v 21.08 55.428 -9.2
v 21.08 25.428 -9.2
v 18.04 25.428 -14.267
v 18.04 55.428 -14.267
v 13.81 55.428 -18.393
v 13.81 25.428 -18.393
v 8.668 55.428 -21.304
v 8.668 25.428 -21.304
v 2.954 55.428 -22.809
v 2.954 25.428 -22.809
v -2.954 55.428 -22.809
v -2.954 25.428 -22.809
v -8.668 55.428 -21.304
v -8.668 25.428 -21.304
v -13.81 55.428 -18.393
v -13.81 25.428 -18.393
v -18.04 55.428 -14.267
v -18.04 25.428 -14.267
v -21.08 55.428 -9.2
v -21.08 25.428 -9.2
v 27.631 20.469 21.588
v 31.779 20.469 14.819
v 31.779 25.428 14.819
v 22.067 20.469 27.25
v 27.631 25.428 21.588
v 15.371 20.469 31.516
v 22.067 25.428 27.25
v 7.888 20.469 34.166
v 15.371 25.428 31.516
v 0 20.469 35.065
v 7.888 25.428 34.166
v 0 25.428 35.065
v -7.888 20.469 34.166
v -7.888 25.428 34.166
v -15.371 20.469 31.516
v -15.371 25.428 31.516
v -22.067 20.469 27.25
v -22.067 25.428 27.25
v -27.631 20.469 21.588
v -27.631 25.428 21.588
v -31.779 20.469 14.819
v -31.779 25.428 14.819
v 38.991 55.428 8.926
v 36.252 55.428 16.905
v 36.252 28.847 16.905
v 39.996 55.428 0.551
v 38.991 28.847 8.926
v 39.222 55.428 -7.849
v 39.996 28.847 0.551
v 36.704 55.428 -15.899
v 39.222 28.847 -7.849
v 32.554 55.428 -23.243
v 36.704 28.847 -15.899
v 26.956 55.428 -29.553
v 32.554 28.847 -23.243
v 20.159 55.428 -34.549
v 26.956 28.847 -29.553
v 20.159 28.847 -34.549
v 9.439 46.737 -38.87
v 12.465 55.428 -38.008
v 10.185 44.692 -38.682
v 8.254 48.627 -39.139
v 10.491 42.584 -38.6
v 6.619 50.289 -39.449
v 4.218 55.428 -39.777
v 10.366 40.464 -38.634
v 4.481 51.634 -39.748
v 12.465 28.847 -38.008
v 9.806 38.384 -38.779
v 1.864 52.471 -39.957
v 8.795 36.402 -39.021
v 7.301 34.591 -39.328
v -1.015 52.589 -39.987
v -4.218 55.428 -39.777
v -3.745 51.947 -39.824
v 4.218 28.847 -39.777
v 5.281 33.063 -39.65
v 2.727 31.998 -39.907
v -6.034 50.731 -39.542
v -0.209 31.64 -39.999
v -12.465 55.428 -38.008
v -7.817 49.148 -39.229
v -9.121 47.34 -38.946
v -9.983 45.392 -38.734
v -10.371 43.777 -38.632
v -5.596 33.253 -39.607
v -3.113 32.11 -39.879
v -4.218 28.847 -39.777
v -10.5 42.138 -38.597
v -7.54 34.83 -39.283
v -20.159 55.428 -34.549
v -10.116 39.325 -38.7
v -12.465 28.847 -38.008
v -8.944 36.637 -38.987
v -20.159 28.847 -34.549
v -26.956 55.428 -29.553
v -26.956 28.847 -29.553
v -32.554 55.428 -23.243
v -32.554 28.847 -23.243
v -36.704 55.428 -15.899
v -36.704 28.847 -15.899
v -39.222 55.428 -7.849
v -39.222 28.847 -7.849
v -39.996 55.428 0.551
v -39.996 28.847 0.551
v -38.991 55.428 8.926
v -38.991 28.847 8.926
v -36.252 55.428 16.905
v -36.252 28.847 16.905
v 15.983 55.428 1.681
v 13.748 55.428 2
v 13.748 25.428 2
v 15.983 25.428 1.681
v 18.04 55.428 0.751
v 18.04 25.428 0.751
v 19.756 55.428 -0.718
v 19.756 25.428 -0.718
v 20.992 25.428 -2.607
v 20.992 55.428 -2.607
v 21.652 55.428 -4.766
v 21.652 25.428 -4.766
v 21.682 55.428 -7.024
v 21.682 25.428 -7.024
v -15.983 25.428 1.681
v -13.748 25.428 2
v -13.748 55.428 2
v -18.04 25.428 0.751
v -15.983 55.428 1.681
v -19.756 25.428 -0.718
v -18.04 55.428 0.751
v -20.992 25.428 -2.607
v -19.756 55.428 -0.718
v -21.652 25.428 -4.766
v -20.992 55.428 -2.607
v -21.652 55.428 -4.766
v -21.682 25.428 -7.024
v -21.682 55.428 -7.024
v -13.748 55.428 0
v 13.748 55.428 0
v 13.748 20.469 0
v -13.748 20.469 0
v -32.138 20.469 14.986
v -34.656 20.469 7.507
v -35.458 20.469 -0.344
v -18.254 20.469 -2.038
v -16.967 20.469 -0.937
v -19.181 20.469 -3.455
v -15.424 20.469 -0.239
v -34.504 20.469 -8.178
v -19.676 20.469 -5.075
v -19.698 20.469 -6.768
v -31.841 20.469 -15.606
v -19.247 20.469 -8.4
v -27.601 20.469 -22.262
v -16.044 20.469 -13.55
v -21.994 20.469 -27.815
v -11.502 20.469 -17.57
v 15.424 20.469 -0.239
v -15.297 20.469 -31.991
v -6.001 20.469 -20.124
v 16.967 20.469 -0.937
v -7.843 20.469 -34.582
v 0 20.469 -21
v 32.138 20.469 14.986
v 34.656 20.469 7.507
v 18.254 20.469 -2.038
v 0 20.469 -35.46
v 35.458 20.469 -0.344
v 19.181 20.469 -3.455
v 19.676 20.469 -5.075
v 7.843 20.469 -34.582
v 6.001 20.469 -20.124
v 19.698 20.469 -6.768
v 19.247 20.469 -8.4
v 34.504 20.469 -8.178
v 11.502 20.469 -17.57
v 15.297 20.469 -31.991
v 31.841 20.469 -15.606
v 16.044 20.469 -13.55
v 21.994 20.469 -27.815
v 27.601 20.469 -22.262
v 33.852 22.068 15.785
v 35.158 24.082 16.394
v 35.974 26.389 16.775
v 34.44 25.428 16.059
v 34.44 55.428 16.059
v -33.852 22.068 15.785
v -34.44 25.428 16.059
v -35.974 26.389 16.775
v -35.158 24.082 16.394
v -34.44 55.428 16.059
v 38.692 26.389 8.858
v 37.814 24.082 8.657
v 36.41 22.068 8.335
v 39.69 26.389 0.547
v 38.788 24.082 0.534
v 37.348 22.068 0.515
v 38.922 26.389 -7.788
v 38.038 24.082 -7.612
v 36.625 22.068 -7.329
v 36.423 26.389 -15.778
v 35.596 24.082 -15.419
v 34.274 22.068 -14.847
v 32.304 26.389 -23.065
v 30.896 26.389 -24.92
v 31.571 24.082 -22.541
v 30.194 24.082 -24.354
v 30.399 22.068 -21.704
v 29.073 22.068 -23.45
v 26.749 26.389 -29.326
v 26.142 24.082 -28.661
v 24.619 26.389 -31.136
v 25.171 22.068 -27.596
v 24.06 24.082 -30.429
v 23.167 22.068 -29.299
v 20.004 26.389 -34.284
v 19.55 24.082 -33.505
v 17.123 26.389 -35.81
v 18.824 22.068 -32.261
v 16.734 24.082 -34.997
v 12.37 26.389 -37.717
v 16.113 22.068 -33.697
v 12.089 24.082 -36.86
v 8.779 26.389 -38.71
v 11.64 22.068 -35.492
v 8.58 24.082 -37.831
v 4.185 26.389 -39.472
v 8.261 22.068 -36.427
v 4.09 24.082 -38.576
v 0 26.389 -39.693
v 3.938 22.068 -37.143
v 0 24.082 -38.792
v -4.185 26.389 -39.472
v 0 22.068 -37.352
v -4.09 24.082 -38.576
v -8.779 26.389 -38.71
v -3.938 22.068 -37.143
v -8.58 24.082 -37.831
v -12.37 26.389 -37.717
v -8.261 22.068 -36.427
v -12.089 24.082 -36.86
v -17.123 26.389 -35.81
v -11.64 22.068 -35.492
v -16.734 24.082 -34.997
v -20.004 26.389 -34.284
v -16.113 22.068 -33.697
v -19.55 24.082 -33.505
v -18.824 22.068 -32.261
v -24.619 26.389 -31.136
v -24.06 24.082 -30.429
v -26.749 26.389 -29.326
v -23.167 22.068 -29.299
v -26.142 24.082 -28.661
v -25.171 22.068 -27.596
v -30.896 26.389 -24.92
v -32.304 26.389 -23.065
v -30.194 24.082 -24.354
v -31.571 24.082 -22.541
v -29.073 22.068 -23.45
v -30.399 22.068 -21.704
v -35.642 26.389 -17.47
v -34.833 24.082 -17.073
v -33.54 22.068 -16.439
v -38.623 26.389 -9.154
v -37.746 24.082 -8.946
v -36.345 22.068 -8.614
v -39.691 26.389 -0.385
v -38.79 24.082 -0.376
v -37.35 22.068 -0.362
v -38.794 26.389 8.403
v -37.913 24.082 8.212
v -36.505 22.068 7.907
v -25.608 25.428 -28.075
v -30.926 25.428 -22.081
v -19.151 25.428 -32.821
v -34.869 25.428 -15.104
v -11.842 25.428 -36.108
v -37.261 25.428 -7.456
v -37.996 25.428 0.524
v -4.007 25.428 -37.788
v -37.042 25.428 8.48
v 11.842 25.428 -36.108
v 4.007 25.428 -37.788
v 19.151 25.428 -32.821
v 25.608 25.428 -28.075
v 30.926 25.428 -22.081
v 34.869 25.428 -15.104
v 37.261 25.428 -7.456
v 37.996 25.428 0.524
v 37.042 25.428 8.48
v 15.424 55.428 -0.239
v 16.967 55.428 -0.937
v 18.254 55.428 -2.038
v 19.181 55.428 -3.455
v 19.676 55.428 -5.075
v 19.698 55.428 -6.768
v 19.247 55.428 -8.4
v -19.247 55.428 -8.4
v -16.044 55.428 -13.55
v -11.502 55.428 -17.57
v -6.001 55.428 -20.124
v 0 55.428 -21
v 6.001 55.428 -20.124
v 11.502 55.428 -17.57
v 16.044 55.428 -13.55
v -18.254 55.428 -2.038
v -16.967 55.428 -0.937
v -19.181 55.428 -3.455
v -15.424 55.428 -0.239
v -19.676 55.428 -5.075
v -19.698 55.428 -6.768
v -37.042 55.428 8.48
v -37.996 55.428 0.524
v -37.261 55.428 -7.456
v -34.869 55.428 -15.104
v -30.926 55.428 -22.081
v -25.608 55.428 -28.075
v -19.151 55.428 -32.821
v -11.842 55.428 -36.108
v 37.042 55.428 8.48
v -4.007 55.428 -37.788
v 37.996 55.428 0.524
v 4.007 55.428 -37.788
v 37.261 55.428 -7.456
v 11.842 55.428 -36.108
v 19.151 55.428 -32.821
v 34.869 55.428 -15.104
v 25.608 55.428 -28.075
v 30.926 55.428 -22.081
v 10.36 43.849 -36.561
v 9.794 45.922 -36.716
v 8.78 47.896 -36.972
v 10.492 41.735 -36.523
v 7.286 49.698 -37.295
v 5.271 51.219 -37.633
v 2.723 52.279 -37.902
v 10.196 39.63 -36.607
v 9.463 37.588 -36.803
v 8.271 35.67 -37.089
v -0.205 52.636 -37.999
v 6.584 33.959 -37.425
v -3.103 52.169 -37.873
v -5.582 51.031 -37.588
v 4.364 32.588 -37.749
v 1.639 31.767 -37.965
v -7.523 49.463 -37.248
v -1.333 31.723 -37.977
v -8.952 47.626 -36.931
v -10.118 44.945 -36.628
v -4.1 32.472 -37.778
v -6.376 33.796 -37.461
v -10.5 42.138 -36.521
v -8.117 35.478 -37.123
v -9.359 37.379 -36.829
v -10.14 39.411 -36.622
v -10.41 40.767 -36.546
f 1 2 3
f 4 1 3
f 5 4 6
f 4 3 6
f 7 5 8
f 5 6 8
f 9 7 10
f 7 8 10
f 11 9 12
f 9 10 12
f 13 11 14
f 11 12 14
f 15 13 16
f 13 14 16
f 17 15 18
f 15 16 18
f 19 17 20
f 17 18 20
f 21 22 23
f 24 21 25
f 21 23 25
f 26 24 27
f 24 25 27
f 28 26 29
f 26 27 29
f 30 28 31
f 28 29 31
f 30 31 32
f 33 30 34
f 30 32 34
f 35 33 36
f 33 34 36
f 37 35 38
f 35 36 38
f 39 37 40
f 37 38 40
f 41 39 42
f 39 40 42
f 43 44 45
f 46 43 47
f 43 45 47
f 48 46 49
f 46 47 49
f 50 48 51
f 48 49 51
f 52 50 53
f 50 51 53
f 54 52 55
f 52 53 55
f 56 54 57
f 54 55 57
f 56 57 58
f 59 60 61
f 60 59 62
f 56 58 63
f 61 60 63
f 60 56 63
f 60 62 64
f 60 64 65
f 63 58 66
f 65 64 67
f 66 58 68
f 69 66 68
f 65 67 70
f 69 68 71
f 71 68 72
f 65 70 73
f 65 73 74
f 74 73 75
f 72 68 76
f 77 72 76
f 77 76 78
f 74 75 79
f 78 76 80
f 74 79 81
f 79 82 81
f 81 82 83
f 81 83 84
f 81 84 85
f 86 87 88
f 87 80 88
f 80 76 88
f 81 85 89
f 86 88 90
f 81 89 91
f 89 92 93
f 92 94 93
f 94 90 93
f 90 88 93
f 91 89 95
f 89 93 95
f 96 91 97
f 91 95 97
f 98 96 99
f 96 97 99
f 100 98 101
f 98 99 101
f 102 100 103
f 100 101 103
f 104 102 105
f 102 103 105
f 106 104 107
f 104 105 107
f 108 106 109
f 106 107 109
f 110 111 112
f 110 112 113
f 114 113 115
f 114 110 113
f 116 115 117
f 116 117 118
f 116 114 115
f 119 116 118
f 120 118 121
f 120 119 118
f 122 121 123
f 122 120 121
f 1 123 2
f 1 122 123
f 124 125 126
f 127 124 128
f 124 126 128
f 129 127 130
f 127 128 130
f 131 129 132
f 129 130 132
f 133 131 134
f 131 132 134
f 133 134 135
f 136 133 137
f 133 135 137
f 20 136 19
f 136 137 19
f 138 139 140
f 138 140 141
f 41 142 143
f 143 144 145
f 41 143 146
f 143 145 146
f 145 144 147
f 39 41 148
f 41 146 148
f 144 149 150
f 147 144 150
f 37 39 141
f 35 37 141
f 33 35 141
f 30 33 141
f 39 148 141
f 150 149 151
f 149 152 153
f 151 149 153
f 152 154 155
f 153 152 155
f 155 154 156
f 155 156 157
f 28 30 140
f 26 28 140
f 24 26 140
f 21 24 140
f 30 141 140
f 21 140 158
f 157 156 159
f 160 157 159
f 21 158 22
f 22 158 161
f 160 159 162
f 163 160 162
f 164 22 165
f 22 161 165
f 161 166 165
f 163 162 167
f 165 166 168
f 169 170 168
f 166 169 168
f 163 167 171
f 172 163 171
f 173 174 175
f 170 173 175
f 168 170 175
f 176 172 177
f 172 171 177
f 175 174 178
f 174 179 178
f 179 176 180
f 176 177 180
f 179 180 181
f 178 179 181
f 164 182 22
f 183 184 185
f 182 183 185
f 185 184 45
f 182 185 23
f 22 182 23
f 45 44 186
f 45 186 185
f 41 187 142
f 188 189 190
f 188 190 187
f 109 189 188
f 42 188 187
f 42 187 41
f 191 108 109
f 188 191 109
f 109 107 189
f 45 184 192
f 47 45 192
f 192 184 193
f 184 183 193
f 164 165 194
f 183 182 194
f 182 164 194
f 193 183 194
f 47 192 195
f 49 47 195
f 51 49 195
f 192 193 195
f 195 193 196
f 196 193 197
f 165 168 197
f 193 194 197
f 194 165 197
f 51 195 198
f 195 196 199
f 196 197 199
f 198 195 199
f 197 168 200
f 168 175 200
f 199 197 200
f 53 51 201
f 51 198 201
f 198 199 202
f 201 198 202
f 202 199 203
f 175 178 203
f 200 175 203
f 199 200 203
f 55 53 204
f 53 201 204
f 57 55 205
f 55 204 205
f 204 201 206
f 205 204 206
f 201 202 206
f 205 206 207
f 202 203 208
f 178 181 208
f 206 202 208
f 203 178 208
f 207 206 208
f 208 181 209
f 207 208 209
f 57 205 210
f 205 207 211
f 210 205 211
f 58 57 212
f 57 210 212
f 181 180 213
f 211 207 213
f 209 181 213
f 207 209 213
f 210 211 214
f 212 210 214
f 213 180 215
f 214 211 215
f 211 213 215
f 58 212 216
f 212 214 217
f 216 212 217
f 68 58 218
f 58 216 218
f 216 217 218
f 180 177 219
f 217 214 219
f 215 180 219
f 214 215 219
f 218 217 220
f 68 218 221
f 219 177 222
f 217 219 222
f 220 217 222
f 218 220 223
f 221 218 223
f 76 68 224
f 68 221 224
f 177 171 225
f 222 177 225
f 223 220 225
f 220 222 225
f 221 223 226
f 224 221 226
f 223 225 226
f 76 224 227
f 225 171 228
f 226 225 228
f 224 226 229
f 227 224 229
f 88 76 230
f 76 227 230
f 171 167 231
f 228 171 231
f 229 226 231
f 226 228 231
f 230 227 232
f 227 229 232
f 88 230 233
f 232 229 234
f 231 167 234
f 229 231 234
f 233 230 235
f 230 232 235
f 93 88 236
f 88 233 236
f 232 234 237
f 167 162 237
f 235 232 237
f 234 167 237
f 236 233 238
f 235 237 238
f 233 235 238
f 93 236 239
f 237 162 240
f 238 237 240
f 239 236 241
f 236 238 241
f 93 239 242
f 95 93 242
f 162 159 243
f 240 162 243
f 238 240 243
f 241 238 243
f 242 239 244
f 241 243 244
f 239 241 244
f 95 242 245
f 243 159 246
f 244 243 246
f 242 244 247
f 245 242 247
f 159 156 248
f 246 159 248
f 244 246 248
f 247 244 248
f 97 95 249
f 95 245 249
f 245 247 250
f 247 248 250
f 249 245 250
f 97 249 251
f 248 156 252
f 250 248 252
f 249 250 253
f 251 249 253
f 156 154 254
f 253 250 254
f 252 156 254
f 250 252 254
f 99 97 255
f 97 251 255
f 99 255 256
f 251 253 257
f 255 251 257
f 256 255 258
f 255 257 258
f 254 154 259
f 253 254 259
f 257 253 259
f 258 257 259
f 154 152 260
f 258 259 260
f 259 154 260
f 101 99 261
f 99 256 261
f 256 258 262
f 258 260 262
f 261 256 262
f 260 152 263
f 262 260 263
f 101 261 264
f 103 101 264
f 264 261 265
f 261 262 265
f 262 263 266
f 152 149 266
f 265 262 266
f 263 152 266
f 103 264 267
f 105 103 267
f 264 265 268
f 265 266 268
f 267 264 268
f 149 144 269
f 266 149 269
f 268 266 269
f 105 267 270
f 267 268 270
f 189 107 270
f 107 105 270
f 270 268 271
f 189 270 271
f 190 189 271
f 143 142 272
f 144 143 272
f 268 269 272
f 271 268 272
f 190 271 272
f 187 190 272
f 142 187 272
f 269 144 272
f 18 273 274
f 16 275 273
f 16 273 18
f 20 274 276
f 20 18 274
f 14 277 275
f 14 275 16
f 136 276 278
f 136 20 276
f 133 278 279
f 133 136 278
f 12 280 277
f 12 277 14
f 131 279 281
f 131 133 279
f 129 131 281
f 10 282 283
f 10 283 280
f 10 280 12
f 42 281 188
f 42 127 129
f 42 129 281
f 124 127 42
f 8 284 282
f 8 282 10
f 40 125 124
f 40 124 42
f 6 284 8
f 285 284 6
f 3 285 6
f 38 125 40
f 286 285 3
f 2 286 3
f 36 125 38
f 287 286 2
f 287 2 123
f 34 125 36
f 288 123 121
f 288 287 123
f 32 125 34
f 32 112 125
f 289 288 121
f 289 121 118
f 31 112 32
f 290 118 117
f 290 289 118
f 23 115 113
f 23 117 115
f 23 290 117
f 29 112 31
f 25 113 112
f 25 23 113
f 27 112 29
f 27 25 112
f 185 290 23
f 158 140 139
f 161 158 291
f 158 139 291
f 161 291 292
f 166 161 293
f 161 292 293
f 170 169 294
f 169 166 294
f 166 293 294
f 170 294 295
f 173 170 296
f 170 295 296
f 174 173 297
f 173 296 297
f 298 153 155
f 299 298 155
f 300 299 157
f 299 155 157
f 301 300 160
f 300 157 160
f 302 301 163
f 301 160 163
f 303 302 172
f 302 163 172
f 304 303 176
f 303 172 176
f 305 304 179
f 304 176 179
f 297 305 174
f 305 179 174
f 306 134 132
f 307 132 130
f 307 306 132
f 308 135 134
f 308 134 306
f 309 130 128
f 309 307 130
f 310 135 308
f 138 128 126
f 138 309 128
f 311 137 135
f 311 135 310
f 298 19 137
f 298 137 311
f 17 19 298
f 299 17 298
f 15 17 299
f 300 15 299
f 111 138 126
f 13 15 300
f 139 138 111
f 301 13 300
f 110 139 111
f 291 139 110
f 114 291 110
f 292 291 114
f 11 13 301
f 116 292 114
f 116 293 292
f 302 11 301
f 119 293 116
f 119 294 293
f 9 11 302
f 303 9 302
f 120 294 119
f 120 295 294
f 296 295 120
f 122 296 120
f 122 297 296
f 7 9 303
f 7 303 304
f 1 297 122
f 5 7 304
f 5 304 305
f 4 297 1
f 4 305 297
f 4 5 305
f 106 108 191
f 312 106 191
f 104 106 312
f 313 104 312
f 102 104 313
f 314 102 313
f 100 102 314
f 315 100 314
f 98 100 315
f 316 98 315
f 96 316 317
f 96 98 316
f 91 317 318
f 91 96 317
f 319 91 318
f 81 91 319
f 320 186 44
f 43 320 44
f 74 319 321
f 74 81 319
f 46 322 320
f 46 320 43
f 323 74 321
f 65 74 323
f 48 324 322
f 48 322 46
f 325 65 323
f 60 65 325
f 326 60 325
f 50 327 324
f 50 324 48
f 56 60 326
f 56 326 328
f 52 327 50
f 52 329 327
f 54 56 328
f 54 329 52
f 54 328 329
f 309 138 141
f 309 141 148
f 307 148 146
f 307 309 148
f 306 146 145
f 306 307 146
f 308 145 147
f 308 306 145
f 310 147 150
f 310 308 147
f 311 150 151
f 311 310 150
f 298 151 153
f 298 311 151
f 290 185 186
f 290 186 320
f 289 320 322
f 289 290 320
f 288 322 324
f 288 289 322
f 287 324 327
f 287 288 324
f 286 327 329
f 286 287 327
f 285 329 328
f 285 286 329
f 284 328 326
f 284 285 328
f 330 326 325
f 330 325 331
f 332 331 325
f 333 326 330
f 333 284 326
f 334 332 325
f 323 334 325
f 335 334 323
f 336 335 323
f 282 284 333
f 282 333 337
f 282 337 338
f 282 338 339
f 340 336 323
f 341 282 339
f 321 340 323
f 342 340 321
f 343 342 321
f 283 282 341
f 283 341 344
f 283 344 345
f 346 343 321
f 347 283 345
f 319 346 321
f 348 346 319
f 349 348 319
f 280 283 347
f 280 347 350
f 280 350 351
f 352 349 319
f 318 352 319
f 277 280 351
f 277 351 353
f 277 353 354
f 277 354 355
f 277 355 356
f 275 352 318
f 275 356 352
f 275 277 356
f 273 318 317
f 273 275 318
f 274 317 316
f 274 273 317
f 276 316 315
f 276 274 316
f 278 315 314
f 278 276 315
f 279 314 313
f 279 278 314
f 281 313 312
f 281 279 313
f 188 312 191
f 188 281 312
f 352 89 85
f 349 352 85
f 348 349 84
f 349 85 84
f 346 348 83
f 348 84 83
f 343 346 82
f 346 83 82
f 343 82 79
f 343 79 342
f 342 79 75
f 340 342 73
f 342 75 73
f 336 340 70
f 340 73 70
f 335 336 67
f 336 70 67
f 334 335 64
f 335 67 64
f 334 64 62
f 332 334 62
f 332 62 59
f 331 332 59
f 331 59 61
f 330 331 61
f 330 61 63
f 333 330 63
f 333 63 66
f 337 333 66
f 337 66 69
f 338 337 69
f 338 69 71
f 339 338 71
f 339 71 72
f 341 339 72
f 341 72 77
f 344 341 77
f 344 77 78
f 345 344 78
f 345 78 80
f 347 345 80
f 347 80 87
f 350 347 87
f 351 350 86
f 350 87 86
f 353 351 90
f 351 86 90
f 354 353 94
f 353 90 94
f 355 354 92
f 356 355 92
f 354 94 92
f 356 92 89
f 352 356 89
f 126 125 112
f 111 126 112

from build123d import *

# Parameters (mm, degrees)
CUT_EXTRUDE3_DEPTH           = 60
CUT_EXTRUDE5_DEPTH           = 2
CUT_EXTRUDE5_DEPTH_BACK      = 30
SKETCH9_R                    = 38
SKETCH9_R_2                  = 23
SKETCH19_W                   = 12
SKETCH19_H                   = 36.5
CUT_REVOLVE2_ANGLE           = 65
CUT_REVOLVE2_OTHER_WAY_ANGLE = 65
SKETCH21_W                   = 3.25
SKETCH21_H                   = 4
BOSS_EXTRUDE3_DEPTH          = 1.35
CIRPATTERN1_COUNT            = 5
CUT_EXTRUDE9_START           = -5
CUT_EXTRUDE9_DEPTH           = 5
SKETCH23_R                   = 10.5
CUT_EXTRUDE10_DEPTH          = 10
SKETCH24_W                   = 17
SKETCH24_H                   = 12
BOSS_EXTRUDE4_DEPTH          = 8
SKETCH26_W                   = 12
SKETCH26_H                   = 8
CUT_EXTRUDE11_DEPTH          = 10
SKETCH27_W                   = 4
SKETCH27_H                   = 5
CUT_EXTRUDE12_DEPTH          = 5
CUT_EXTRUDE14_DEPTH          = 2
CUT_EXTRUDE14_DEPTH_BACK     = 30
SKETCH29_R                   = 1
CUT_EXTRUDE15_DEPTH          = 15
FILLET1_R                    = 6
FILLET2_R                    = 8
SKETCH30_W                   = 97.703590575
SKETCH30_H                   = 5
CUT_EXTRUDE16_DEPTH          = 5
INTERSECT1_DEPTH             = 20.469057744
INTERSECT1_START             = 55.427876097
INTERSECT1_2_OUTLINE_R       = 40
INTERSECT1_2_OUTLINE_W       = 12
INTERSECT1_2_OUTLINE_H       = 8
INTERSECT1_2_DEPTH           = 8
INTERSECT1_START_2           = 50.427876097
INTERSECT1_3_OUTLINE_W       = 17
INTERSECT1_3_OUTLINE_H       = 12
INTERSECT1_3_OUTLINE_W_2     = 12
INTERSECT1_3_OUTLINE_H_2     = 8
INTERSECT1_3_DEPTH           = 5


with BuildPart() as part:
    # Sketch1 → Revolve1 (revolve)
    with BuildSketch(Plane.XY, mode=Mode.PRIVATE) as revolve1_sk:
        with BuildLine():
            Line((0, 63.427876097), (32, 63.427876097))
            ThreePointArc((32, 63.427876097), (37.656854249, 61.084730346), (40, 55.427876097))
            Line((40, 55.427876097), (40, 28.846818009))
            ThreePointArc((40, 28.846818009), (38.792081772, 24.082439968), (35.460140376, 20.469057744))
            Line((35.460140376, 20.469057744), (28.539859624, 15.958818353))
            ThreePointArc((28.539859624, 15.958818353), (25.207918228, 12.345436129), (24, 7.581058088))
            Line((24, 7.581058088), (24, 3.25))
            Line((24, 3.25), (24.35, 3))
            Line((24.35, 3), (24.35, 0))
            Line((24.35, 0), (22.5, 0))
            Line((22.5, 0), (22.5, 12.5))
            ThreePointArc((22.5, 12.5), (22.353553391, 12.853553391), (22, 13))
            Line((22, 13), (0, 13))
            Line((0, 13), (0, 63.427876097))
        make_face()
    revolve(revolve1_sk.sketch.rotate(Axis((0, 0, 0), (0, 1, 0)), 90), axis=Axis((0, 0, 0), (0, 1, 0)))

    # Sketch11 → Cut-Extrude3 (cut)
    with BuildSketch(Plane(origin=(0, 13, 0), x_dir=(-1, 0, 0), z_dir=(0, -1, 0))):
        with BuildLine():
            Line((-21, 0), (21, 0))
            ThreePointArc((21, 0), (0, 21), (-21, 0))
        make_face()
    extrude(amount=-CUT_EXTRUDE3_DEPTH, mode=Mode.SUBTRACT)

    # Sketch9 → Cut-Extrude5 (cut, two sides: drawn at the far end of the back side and taken through both)
    with BuildSketch(Plane(origin=(0, 55.427876097, 0), x_dir=(1, 0, 0), z_dir=(0, 1, 0)).offset(-CUT_EXTRUDE5_DEPTH_BACK)):
        with Locations(Location((0, 0, 0), (0, 0, 270))):
            Circle(SKETCH9_R)
        with Locations(Location((0, 0, 0), (0, 0, 270))):
            Circle(SKETCH9_R_2, mode=Mode.SUBTRACT)
    extrude(amount=CUT_EXTRUDE5_DEPTH + CUT_EXTRUDE5_DEPTH_BACK, mode=Mode.SUBTRACT)

    # Sketch19 → Cut-Revolve2 (revolve, cut)
    with BuildSketch(Plane(origin=(0, 0, 0), x_dir=(0, 0, -1), z_dir=(1, 0, 0))):
        with Locations((-41.064715832, 37.177876097)):
            Rectangle(SKETCH19_W, SKETCH19_H)
    revolve(axis=Axis((0, 0, 0), (0, 1, 0)), revolution_arc=CUT_REVOLVE2_ANGLE, mode=Mode.SUBTRACT)

    # Sketch19 → Cut-Revolve2 other way (revolve, cut)
    with BuildSketch(Plane(origin=(0, 0, 0), x_dir=(0, 0, -1), z_dir=(1, 0, 0))):
        with Locations((-41.064715832, 37.177876097)):
            Rectangle(SKETCH19_W, SKETCH19_H)
    revolve(axis=Axis((0, 0, 0), (0, -1, 0)), revolution_arc=CUT_REVOLVE2_OTHER_WAY_ANGLE, mode=Mode.SUBTRACT)

    # Sketch21 → Boss-Extrude3 (add)
    with BuildSketch(Plane(origin=(0, 0, 22.5), x_dir=(-1, 0, 0), z_dir=(0, 0, -1))):
        with Locations((0, 2)):
            Rectangle(SKETCH21_W, SKETCH21_H)
    boss_extrude3 = extrude(amount=BOSS_EXTRUDE3_DEPTH)

    # CirPattern1: Boss-Extrude3 ×5 about axis
    cirpattern1_axis = Axis((0, 0, 0), (0, 1, 0))
    for i in range(1, CIRPATTERN1_COUNT):
        add(boss_extrude3.rotate(cirpattern1_axis, i * 360 / CIRPATTERN1_COUNT))

    # Cut-Extrude9: read off the stored shape, not the designer's step
    # Cut-Extrude9 outline → Cut-Extrude9 (cut)
    with BuildSketch(Plane(origin=(0, 63.427876097, 0), x_dir=(1, 0, 0), z_dir=(0, 1, 0)).offset(CUT_EXTRUDE9_START)):
        with BuildLine():
            ThreePointArc((40, 0), (0, 40), (-40, 0))
            Line((-40, 0), (-21, 0))
            ThreePointArc((-21, 0), (0, 21), (21, 0))
            Line((21, 0), (40, 0))
        make_face()
    extrude(amount=CUT_EXTRUDE9_DEPTH, mode=Mode.SUBTRACT)

    # Sketch23 → Cut-Extrude10 (cut)
    with BuildSketch(Plane(origin=(0, 0, -40), x_dir=(-1, 0, 0), z_dir=(0, 0, -1))):
        with Locations((0, 42.137876097)):
            Circle(SKETCH23_R)
    extrude(amount=-CUT_EXTRUDE10_DEPTH, mode=Mode.SUBTRACT)

    # Sketch24 → Boss-Extrude4 (add)
    with BuildSketch(Plane(origin=(0, 58.427876097, 0), x_dir=(1, 0, 0), z_dir=(0, 1, 0))):
        with Locations((0, 30)):
            Rectangle(SKETCH24_W, SKETCH24_H)
    extrude(amount=-BOSS_EXTRUDE4_DEPTH)

    # Sketch26 → Cut-Extrude11 (cut)
    with BuildSketch(Plane(origin=(0, 58.427876097, 0), x_dir=(1, 0, 0), z_dir=(0, 1, 0))):
        with Locations((0, 30)):
            Rectangle(SKETCH26_W, SKETCH26_H)
    extrude(amount=-CUT_EXTRUDE11_DEPTH, mode=Mode.SUBTRACT)

    # Sketch27 → Cut-Extrude12 (cut)
    with BuildSketch(Plane(origin=(8.5, 0, 0), x_dir=(0, 0, -1), z_dir=(1, 0, 0))):
        with Locations((29.5, 53.927876097)):
            Rectangle(SKETCH27_W, SKETCH27_H)
    extrude(amount=-CUT_EXTRUDE12_DEPTH, mode=Mode.SUBTRACT)

    # Sketch28 → Cut-Extrude14 (cut, two sides: drawn at the far end of the back side and taken through both)
    with BuildSketch(Plane(origin=(0, 55.427876097, 0), x_dir=(1, 0, 0), z_dir=(0, 1, 0)).offset(-CUT_EXTRUDE14_DEPTH_BACK)):
        with BuildLine():
            Line((-22.912878475, -2), (22.912878475, -2))
            ThreePointArc((22.912878475, -2), (0, -23), (-22.912878475, -2))
        make_face()
    extrude(amount=CUT_EXTRUDE14_DEPTH + CUT_EXTRUDE14_DEPTH_BACK, mode=Mode.SUBTRACT)

    # Sketch29 → Cut-Extrude15 (cut)
    with BuildSketch(Plane(origin=(0, 0, 0), x_dir=(-1, 0, 0), z_dir=(0, 0, -1))):
        with Locations((-30.416198487, 60.927876097)):
            Circle(SKETCH29_R)
        with Locations((30.416198487, 60.927876097)):
            Circle(SKETCH29_R)
        with Locations((0, 60.927876097)):
            Circle(SKETCH29_R)
    extrude(amount=-CUT_EXTRUDE15_DEPTH, mode=Mode.SUBTRACT)

    # Fillet1
    fillet1_edges = [part.edges().sort_by_distance(p)[0] for p in [
        (21, 35.713938048, 0),
        (-21, 35.713938048, 0),
    ]]
    fillet(fillet1_edges, radius=FILLET1_R)

    # Fillet2
    fillet2_edges = [part.edges().sort_by_distance(p)[0] for p in [
        (-22.912878475, 41.427876097, 2),
        (22.912878475, 41.427876097, 2),
    ]]
    fillet(fillet2_edges, radius=FILLET2_R)

    # Sketch30 → Cut-Extrude16 (cut)
    with BuildSketch(Plane(origin=(0, 63.427876097, 0), x_dir=(1, 0, 0), z_dir=(0, 1, 0))):
        with Locations((-0.528699084, -2.5)):
            Rectangle(SKETCH30_W, SKETCH30_H)
    extrude(amount=-CUT_EXTRUDE16_DEPTH, mode=Mode.SUBTRACT)

    # Intersect1: read off the stored shape, not the designer's step
    # Intersect1 outline → Intersect1 (cut)
    with BuildSketch(Plane(origin=(0, 0, 0), x_dir=(1, 0, 0), z_dir=(0, 1, 0))):
        with BuildLine():
            Line((31.779425009, -14.818989253), (32.137801352, -14.986102887))
            ThreePointArc((32.137801352, -14.986102887), (0, 35.460140376), (-32.137801352, -14.986102887))
            Line((-32.137801352, -14.986102887), (-31.779425009, -14.818989253))
            ThreePointArc((-31.779425009, -14.818989253), (0, -35.064715832), (31.779425009, -14.818989253))
        make_face()
        with BuildLine():
            ThreePointArc((-13.747727085, 0), (-18.767687244, 2.713664655), (-19.246817919, 8.4))
            ThreePointArc((-19.246817919, 8.4), (0, 21), (19.246817919, 8.4))
            ThreePointArc((19.246817919, 8.4), (18.767687244, 2.713664655), (13.747727085, 0))
            Line((13.747727085, 0), (-13.747727085, 0))
        make_face(mode=Mode.SUBTRACT)
    extrude(amount=INTERSECT1_DEPTH, mode=Mode.SUBTRACT)

    # Intersect1 2 outline → Intersect1 2 (cut)
    with BuildSketch(Plane(origin=(0, 0, 0), x_dir=(1, 0, 0), z_dir=(0, 1, 0)).offset(INTERSECT1_START)):
        Circle(INTERSECT1_2_OUTLINE_R)
        with Locations((0, 30)):
            Rectangle(INTERSECT1_2_OUTLINE_W, INTERSECT1_2_OUTLINE_H, mode=Mode.SUBTRACT)
        with BuildLine():
            ThreePointArc((-13.747727085, 0), (-18.767687244, 2.713664655), (-19.246817919, 8.4))
            ThreePointArc((-19.246817919, 8.4), (0, 21), (19.246817919, 8.4))
            ThreePointArc((19.246817919, 8.4), (18.767687244, 2.713664655), (13.747727085, 0))
            Line((13.747727085, 0), (-13.747727085, 0))
        make_face(mode=Mode.SUBTRACT)
    extrude(amount=INTERSECT1_2_DEPTH, mode=Mode.SUBTRACT)

    # Intersect1 3 outline → Intersect1 3 (cut)
    with BuildSketch(Plane(origin=(0, 0, 0), x_dir=(1, 0, 0), z_dir=(0, 1, 0)).offset(INTERSECT1_START_2)):
        with Locations((0, 30)):
            Rectangle(INTERSECT1_3_OUTLINE_W, INTERSECT1_3_OUTLINE_H)
        with Locations((0, 30)):
            Rectangle(INTERSECT1_3_OUTLINE_W_2, INTERSECT1_3_OUTLINE_H_2, mode=Mode.SUBTRACT)
    extrude(amount=INTERSECT1_3_DEPTH, mode=Mode.SUBTRACT)


solid = part.part
